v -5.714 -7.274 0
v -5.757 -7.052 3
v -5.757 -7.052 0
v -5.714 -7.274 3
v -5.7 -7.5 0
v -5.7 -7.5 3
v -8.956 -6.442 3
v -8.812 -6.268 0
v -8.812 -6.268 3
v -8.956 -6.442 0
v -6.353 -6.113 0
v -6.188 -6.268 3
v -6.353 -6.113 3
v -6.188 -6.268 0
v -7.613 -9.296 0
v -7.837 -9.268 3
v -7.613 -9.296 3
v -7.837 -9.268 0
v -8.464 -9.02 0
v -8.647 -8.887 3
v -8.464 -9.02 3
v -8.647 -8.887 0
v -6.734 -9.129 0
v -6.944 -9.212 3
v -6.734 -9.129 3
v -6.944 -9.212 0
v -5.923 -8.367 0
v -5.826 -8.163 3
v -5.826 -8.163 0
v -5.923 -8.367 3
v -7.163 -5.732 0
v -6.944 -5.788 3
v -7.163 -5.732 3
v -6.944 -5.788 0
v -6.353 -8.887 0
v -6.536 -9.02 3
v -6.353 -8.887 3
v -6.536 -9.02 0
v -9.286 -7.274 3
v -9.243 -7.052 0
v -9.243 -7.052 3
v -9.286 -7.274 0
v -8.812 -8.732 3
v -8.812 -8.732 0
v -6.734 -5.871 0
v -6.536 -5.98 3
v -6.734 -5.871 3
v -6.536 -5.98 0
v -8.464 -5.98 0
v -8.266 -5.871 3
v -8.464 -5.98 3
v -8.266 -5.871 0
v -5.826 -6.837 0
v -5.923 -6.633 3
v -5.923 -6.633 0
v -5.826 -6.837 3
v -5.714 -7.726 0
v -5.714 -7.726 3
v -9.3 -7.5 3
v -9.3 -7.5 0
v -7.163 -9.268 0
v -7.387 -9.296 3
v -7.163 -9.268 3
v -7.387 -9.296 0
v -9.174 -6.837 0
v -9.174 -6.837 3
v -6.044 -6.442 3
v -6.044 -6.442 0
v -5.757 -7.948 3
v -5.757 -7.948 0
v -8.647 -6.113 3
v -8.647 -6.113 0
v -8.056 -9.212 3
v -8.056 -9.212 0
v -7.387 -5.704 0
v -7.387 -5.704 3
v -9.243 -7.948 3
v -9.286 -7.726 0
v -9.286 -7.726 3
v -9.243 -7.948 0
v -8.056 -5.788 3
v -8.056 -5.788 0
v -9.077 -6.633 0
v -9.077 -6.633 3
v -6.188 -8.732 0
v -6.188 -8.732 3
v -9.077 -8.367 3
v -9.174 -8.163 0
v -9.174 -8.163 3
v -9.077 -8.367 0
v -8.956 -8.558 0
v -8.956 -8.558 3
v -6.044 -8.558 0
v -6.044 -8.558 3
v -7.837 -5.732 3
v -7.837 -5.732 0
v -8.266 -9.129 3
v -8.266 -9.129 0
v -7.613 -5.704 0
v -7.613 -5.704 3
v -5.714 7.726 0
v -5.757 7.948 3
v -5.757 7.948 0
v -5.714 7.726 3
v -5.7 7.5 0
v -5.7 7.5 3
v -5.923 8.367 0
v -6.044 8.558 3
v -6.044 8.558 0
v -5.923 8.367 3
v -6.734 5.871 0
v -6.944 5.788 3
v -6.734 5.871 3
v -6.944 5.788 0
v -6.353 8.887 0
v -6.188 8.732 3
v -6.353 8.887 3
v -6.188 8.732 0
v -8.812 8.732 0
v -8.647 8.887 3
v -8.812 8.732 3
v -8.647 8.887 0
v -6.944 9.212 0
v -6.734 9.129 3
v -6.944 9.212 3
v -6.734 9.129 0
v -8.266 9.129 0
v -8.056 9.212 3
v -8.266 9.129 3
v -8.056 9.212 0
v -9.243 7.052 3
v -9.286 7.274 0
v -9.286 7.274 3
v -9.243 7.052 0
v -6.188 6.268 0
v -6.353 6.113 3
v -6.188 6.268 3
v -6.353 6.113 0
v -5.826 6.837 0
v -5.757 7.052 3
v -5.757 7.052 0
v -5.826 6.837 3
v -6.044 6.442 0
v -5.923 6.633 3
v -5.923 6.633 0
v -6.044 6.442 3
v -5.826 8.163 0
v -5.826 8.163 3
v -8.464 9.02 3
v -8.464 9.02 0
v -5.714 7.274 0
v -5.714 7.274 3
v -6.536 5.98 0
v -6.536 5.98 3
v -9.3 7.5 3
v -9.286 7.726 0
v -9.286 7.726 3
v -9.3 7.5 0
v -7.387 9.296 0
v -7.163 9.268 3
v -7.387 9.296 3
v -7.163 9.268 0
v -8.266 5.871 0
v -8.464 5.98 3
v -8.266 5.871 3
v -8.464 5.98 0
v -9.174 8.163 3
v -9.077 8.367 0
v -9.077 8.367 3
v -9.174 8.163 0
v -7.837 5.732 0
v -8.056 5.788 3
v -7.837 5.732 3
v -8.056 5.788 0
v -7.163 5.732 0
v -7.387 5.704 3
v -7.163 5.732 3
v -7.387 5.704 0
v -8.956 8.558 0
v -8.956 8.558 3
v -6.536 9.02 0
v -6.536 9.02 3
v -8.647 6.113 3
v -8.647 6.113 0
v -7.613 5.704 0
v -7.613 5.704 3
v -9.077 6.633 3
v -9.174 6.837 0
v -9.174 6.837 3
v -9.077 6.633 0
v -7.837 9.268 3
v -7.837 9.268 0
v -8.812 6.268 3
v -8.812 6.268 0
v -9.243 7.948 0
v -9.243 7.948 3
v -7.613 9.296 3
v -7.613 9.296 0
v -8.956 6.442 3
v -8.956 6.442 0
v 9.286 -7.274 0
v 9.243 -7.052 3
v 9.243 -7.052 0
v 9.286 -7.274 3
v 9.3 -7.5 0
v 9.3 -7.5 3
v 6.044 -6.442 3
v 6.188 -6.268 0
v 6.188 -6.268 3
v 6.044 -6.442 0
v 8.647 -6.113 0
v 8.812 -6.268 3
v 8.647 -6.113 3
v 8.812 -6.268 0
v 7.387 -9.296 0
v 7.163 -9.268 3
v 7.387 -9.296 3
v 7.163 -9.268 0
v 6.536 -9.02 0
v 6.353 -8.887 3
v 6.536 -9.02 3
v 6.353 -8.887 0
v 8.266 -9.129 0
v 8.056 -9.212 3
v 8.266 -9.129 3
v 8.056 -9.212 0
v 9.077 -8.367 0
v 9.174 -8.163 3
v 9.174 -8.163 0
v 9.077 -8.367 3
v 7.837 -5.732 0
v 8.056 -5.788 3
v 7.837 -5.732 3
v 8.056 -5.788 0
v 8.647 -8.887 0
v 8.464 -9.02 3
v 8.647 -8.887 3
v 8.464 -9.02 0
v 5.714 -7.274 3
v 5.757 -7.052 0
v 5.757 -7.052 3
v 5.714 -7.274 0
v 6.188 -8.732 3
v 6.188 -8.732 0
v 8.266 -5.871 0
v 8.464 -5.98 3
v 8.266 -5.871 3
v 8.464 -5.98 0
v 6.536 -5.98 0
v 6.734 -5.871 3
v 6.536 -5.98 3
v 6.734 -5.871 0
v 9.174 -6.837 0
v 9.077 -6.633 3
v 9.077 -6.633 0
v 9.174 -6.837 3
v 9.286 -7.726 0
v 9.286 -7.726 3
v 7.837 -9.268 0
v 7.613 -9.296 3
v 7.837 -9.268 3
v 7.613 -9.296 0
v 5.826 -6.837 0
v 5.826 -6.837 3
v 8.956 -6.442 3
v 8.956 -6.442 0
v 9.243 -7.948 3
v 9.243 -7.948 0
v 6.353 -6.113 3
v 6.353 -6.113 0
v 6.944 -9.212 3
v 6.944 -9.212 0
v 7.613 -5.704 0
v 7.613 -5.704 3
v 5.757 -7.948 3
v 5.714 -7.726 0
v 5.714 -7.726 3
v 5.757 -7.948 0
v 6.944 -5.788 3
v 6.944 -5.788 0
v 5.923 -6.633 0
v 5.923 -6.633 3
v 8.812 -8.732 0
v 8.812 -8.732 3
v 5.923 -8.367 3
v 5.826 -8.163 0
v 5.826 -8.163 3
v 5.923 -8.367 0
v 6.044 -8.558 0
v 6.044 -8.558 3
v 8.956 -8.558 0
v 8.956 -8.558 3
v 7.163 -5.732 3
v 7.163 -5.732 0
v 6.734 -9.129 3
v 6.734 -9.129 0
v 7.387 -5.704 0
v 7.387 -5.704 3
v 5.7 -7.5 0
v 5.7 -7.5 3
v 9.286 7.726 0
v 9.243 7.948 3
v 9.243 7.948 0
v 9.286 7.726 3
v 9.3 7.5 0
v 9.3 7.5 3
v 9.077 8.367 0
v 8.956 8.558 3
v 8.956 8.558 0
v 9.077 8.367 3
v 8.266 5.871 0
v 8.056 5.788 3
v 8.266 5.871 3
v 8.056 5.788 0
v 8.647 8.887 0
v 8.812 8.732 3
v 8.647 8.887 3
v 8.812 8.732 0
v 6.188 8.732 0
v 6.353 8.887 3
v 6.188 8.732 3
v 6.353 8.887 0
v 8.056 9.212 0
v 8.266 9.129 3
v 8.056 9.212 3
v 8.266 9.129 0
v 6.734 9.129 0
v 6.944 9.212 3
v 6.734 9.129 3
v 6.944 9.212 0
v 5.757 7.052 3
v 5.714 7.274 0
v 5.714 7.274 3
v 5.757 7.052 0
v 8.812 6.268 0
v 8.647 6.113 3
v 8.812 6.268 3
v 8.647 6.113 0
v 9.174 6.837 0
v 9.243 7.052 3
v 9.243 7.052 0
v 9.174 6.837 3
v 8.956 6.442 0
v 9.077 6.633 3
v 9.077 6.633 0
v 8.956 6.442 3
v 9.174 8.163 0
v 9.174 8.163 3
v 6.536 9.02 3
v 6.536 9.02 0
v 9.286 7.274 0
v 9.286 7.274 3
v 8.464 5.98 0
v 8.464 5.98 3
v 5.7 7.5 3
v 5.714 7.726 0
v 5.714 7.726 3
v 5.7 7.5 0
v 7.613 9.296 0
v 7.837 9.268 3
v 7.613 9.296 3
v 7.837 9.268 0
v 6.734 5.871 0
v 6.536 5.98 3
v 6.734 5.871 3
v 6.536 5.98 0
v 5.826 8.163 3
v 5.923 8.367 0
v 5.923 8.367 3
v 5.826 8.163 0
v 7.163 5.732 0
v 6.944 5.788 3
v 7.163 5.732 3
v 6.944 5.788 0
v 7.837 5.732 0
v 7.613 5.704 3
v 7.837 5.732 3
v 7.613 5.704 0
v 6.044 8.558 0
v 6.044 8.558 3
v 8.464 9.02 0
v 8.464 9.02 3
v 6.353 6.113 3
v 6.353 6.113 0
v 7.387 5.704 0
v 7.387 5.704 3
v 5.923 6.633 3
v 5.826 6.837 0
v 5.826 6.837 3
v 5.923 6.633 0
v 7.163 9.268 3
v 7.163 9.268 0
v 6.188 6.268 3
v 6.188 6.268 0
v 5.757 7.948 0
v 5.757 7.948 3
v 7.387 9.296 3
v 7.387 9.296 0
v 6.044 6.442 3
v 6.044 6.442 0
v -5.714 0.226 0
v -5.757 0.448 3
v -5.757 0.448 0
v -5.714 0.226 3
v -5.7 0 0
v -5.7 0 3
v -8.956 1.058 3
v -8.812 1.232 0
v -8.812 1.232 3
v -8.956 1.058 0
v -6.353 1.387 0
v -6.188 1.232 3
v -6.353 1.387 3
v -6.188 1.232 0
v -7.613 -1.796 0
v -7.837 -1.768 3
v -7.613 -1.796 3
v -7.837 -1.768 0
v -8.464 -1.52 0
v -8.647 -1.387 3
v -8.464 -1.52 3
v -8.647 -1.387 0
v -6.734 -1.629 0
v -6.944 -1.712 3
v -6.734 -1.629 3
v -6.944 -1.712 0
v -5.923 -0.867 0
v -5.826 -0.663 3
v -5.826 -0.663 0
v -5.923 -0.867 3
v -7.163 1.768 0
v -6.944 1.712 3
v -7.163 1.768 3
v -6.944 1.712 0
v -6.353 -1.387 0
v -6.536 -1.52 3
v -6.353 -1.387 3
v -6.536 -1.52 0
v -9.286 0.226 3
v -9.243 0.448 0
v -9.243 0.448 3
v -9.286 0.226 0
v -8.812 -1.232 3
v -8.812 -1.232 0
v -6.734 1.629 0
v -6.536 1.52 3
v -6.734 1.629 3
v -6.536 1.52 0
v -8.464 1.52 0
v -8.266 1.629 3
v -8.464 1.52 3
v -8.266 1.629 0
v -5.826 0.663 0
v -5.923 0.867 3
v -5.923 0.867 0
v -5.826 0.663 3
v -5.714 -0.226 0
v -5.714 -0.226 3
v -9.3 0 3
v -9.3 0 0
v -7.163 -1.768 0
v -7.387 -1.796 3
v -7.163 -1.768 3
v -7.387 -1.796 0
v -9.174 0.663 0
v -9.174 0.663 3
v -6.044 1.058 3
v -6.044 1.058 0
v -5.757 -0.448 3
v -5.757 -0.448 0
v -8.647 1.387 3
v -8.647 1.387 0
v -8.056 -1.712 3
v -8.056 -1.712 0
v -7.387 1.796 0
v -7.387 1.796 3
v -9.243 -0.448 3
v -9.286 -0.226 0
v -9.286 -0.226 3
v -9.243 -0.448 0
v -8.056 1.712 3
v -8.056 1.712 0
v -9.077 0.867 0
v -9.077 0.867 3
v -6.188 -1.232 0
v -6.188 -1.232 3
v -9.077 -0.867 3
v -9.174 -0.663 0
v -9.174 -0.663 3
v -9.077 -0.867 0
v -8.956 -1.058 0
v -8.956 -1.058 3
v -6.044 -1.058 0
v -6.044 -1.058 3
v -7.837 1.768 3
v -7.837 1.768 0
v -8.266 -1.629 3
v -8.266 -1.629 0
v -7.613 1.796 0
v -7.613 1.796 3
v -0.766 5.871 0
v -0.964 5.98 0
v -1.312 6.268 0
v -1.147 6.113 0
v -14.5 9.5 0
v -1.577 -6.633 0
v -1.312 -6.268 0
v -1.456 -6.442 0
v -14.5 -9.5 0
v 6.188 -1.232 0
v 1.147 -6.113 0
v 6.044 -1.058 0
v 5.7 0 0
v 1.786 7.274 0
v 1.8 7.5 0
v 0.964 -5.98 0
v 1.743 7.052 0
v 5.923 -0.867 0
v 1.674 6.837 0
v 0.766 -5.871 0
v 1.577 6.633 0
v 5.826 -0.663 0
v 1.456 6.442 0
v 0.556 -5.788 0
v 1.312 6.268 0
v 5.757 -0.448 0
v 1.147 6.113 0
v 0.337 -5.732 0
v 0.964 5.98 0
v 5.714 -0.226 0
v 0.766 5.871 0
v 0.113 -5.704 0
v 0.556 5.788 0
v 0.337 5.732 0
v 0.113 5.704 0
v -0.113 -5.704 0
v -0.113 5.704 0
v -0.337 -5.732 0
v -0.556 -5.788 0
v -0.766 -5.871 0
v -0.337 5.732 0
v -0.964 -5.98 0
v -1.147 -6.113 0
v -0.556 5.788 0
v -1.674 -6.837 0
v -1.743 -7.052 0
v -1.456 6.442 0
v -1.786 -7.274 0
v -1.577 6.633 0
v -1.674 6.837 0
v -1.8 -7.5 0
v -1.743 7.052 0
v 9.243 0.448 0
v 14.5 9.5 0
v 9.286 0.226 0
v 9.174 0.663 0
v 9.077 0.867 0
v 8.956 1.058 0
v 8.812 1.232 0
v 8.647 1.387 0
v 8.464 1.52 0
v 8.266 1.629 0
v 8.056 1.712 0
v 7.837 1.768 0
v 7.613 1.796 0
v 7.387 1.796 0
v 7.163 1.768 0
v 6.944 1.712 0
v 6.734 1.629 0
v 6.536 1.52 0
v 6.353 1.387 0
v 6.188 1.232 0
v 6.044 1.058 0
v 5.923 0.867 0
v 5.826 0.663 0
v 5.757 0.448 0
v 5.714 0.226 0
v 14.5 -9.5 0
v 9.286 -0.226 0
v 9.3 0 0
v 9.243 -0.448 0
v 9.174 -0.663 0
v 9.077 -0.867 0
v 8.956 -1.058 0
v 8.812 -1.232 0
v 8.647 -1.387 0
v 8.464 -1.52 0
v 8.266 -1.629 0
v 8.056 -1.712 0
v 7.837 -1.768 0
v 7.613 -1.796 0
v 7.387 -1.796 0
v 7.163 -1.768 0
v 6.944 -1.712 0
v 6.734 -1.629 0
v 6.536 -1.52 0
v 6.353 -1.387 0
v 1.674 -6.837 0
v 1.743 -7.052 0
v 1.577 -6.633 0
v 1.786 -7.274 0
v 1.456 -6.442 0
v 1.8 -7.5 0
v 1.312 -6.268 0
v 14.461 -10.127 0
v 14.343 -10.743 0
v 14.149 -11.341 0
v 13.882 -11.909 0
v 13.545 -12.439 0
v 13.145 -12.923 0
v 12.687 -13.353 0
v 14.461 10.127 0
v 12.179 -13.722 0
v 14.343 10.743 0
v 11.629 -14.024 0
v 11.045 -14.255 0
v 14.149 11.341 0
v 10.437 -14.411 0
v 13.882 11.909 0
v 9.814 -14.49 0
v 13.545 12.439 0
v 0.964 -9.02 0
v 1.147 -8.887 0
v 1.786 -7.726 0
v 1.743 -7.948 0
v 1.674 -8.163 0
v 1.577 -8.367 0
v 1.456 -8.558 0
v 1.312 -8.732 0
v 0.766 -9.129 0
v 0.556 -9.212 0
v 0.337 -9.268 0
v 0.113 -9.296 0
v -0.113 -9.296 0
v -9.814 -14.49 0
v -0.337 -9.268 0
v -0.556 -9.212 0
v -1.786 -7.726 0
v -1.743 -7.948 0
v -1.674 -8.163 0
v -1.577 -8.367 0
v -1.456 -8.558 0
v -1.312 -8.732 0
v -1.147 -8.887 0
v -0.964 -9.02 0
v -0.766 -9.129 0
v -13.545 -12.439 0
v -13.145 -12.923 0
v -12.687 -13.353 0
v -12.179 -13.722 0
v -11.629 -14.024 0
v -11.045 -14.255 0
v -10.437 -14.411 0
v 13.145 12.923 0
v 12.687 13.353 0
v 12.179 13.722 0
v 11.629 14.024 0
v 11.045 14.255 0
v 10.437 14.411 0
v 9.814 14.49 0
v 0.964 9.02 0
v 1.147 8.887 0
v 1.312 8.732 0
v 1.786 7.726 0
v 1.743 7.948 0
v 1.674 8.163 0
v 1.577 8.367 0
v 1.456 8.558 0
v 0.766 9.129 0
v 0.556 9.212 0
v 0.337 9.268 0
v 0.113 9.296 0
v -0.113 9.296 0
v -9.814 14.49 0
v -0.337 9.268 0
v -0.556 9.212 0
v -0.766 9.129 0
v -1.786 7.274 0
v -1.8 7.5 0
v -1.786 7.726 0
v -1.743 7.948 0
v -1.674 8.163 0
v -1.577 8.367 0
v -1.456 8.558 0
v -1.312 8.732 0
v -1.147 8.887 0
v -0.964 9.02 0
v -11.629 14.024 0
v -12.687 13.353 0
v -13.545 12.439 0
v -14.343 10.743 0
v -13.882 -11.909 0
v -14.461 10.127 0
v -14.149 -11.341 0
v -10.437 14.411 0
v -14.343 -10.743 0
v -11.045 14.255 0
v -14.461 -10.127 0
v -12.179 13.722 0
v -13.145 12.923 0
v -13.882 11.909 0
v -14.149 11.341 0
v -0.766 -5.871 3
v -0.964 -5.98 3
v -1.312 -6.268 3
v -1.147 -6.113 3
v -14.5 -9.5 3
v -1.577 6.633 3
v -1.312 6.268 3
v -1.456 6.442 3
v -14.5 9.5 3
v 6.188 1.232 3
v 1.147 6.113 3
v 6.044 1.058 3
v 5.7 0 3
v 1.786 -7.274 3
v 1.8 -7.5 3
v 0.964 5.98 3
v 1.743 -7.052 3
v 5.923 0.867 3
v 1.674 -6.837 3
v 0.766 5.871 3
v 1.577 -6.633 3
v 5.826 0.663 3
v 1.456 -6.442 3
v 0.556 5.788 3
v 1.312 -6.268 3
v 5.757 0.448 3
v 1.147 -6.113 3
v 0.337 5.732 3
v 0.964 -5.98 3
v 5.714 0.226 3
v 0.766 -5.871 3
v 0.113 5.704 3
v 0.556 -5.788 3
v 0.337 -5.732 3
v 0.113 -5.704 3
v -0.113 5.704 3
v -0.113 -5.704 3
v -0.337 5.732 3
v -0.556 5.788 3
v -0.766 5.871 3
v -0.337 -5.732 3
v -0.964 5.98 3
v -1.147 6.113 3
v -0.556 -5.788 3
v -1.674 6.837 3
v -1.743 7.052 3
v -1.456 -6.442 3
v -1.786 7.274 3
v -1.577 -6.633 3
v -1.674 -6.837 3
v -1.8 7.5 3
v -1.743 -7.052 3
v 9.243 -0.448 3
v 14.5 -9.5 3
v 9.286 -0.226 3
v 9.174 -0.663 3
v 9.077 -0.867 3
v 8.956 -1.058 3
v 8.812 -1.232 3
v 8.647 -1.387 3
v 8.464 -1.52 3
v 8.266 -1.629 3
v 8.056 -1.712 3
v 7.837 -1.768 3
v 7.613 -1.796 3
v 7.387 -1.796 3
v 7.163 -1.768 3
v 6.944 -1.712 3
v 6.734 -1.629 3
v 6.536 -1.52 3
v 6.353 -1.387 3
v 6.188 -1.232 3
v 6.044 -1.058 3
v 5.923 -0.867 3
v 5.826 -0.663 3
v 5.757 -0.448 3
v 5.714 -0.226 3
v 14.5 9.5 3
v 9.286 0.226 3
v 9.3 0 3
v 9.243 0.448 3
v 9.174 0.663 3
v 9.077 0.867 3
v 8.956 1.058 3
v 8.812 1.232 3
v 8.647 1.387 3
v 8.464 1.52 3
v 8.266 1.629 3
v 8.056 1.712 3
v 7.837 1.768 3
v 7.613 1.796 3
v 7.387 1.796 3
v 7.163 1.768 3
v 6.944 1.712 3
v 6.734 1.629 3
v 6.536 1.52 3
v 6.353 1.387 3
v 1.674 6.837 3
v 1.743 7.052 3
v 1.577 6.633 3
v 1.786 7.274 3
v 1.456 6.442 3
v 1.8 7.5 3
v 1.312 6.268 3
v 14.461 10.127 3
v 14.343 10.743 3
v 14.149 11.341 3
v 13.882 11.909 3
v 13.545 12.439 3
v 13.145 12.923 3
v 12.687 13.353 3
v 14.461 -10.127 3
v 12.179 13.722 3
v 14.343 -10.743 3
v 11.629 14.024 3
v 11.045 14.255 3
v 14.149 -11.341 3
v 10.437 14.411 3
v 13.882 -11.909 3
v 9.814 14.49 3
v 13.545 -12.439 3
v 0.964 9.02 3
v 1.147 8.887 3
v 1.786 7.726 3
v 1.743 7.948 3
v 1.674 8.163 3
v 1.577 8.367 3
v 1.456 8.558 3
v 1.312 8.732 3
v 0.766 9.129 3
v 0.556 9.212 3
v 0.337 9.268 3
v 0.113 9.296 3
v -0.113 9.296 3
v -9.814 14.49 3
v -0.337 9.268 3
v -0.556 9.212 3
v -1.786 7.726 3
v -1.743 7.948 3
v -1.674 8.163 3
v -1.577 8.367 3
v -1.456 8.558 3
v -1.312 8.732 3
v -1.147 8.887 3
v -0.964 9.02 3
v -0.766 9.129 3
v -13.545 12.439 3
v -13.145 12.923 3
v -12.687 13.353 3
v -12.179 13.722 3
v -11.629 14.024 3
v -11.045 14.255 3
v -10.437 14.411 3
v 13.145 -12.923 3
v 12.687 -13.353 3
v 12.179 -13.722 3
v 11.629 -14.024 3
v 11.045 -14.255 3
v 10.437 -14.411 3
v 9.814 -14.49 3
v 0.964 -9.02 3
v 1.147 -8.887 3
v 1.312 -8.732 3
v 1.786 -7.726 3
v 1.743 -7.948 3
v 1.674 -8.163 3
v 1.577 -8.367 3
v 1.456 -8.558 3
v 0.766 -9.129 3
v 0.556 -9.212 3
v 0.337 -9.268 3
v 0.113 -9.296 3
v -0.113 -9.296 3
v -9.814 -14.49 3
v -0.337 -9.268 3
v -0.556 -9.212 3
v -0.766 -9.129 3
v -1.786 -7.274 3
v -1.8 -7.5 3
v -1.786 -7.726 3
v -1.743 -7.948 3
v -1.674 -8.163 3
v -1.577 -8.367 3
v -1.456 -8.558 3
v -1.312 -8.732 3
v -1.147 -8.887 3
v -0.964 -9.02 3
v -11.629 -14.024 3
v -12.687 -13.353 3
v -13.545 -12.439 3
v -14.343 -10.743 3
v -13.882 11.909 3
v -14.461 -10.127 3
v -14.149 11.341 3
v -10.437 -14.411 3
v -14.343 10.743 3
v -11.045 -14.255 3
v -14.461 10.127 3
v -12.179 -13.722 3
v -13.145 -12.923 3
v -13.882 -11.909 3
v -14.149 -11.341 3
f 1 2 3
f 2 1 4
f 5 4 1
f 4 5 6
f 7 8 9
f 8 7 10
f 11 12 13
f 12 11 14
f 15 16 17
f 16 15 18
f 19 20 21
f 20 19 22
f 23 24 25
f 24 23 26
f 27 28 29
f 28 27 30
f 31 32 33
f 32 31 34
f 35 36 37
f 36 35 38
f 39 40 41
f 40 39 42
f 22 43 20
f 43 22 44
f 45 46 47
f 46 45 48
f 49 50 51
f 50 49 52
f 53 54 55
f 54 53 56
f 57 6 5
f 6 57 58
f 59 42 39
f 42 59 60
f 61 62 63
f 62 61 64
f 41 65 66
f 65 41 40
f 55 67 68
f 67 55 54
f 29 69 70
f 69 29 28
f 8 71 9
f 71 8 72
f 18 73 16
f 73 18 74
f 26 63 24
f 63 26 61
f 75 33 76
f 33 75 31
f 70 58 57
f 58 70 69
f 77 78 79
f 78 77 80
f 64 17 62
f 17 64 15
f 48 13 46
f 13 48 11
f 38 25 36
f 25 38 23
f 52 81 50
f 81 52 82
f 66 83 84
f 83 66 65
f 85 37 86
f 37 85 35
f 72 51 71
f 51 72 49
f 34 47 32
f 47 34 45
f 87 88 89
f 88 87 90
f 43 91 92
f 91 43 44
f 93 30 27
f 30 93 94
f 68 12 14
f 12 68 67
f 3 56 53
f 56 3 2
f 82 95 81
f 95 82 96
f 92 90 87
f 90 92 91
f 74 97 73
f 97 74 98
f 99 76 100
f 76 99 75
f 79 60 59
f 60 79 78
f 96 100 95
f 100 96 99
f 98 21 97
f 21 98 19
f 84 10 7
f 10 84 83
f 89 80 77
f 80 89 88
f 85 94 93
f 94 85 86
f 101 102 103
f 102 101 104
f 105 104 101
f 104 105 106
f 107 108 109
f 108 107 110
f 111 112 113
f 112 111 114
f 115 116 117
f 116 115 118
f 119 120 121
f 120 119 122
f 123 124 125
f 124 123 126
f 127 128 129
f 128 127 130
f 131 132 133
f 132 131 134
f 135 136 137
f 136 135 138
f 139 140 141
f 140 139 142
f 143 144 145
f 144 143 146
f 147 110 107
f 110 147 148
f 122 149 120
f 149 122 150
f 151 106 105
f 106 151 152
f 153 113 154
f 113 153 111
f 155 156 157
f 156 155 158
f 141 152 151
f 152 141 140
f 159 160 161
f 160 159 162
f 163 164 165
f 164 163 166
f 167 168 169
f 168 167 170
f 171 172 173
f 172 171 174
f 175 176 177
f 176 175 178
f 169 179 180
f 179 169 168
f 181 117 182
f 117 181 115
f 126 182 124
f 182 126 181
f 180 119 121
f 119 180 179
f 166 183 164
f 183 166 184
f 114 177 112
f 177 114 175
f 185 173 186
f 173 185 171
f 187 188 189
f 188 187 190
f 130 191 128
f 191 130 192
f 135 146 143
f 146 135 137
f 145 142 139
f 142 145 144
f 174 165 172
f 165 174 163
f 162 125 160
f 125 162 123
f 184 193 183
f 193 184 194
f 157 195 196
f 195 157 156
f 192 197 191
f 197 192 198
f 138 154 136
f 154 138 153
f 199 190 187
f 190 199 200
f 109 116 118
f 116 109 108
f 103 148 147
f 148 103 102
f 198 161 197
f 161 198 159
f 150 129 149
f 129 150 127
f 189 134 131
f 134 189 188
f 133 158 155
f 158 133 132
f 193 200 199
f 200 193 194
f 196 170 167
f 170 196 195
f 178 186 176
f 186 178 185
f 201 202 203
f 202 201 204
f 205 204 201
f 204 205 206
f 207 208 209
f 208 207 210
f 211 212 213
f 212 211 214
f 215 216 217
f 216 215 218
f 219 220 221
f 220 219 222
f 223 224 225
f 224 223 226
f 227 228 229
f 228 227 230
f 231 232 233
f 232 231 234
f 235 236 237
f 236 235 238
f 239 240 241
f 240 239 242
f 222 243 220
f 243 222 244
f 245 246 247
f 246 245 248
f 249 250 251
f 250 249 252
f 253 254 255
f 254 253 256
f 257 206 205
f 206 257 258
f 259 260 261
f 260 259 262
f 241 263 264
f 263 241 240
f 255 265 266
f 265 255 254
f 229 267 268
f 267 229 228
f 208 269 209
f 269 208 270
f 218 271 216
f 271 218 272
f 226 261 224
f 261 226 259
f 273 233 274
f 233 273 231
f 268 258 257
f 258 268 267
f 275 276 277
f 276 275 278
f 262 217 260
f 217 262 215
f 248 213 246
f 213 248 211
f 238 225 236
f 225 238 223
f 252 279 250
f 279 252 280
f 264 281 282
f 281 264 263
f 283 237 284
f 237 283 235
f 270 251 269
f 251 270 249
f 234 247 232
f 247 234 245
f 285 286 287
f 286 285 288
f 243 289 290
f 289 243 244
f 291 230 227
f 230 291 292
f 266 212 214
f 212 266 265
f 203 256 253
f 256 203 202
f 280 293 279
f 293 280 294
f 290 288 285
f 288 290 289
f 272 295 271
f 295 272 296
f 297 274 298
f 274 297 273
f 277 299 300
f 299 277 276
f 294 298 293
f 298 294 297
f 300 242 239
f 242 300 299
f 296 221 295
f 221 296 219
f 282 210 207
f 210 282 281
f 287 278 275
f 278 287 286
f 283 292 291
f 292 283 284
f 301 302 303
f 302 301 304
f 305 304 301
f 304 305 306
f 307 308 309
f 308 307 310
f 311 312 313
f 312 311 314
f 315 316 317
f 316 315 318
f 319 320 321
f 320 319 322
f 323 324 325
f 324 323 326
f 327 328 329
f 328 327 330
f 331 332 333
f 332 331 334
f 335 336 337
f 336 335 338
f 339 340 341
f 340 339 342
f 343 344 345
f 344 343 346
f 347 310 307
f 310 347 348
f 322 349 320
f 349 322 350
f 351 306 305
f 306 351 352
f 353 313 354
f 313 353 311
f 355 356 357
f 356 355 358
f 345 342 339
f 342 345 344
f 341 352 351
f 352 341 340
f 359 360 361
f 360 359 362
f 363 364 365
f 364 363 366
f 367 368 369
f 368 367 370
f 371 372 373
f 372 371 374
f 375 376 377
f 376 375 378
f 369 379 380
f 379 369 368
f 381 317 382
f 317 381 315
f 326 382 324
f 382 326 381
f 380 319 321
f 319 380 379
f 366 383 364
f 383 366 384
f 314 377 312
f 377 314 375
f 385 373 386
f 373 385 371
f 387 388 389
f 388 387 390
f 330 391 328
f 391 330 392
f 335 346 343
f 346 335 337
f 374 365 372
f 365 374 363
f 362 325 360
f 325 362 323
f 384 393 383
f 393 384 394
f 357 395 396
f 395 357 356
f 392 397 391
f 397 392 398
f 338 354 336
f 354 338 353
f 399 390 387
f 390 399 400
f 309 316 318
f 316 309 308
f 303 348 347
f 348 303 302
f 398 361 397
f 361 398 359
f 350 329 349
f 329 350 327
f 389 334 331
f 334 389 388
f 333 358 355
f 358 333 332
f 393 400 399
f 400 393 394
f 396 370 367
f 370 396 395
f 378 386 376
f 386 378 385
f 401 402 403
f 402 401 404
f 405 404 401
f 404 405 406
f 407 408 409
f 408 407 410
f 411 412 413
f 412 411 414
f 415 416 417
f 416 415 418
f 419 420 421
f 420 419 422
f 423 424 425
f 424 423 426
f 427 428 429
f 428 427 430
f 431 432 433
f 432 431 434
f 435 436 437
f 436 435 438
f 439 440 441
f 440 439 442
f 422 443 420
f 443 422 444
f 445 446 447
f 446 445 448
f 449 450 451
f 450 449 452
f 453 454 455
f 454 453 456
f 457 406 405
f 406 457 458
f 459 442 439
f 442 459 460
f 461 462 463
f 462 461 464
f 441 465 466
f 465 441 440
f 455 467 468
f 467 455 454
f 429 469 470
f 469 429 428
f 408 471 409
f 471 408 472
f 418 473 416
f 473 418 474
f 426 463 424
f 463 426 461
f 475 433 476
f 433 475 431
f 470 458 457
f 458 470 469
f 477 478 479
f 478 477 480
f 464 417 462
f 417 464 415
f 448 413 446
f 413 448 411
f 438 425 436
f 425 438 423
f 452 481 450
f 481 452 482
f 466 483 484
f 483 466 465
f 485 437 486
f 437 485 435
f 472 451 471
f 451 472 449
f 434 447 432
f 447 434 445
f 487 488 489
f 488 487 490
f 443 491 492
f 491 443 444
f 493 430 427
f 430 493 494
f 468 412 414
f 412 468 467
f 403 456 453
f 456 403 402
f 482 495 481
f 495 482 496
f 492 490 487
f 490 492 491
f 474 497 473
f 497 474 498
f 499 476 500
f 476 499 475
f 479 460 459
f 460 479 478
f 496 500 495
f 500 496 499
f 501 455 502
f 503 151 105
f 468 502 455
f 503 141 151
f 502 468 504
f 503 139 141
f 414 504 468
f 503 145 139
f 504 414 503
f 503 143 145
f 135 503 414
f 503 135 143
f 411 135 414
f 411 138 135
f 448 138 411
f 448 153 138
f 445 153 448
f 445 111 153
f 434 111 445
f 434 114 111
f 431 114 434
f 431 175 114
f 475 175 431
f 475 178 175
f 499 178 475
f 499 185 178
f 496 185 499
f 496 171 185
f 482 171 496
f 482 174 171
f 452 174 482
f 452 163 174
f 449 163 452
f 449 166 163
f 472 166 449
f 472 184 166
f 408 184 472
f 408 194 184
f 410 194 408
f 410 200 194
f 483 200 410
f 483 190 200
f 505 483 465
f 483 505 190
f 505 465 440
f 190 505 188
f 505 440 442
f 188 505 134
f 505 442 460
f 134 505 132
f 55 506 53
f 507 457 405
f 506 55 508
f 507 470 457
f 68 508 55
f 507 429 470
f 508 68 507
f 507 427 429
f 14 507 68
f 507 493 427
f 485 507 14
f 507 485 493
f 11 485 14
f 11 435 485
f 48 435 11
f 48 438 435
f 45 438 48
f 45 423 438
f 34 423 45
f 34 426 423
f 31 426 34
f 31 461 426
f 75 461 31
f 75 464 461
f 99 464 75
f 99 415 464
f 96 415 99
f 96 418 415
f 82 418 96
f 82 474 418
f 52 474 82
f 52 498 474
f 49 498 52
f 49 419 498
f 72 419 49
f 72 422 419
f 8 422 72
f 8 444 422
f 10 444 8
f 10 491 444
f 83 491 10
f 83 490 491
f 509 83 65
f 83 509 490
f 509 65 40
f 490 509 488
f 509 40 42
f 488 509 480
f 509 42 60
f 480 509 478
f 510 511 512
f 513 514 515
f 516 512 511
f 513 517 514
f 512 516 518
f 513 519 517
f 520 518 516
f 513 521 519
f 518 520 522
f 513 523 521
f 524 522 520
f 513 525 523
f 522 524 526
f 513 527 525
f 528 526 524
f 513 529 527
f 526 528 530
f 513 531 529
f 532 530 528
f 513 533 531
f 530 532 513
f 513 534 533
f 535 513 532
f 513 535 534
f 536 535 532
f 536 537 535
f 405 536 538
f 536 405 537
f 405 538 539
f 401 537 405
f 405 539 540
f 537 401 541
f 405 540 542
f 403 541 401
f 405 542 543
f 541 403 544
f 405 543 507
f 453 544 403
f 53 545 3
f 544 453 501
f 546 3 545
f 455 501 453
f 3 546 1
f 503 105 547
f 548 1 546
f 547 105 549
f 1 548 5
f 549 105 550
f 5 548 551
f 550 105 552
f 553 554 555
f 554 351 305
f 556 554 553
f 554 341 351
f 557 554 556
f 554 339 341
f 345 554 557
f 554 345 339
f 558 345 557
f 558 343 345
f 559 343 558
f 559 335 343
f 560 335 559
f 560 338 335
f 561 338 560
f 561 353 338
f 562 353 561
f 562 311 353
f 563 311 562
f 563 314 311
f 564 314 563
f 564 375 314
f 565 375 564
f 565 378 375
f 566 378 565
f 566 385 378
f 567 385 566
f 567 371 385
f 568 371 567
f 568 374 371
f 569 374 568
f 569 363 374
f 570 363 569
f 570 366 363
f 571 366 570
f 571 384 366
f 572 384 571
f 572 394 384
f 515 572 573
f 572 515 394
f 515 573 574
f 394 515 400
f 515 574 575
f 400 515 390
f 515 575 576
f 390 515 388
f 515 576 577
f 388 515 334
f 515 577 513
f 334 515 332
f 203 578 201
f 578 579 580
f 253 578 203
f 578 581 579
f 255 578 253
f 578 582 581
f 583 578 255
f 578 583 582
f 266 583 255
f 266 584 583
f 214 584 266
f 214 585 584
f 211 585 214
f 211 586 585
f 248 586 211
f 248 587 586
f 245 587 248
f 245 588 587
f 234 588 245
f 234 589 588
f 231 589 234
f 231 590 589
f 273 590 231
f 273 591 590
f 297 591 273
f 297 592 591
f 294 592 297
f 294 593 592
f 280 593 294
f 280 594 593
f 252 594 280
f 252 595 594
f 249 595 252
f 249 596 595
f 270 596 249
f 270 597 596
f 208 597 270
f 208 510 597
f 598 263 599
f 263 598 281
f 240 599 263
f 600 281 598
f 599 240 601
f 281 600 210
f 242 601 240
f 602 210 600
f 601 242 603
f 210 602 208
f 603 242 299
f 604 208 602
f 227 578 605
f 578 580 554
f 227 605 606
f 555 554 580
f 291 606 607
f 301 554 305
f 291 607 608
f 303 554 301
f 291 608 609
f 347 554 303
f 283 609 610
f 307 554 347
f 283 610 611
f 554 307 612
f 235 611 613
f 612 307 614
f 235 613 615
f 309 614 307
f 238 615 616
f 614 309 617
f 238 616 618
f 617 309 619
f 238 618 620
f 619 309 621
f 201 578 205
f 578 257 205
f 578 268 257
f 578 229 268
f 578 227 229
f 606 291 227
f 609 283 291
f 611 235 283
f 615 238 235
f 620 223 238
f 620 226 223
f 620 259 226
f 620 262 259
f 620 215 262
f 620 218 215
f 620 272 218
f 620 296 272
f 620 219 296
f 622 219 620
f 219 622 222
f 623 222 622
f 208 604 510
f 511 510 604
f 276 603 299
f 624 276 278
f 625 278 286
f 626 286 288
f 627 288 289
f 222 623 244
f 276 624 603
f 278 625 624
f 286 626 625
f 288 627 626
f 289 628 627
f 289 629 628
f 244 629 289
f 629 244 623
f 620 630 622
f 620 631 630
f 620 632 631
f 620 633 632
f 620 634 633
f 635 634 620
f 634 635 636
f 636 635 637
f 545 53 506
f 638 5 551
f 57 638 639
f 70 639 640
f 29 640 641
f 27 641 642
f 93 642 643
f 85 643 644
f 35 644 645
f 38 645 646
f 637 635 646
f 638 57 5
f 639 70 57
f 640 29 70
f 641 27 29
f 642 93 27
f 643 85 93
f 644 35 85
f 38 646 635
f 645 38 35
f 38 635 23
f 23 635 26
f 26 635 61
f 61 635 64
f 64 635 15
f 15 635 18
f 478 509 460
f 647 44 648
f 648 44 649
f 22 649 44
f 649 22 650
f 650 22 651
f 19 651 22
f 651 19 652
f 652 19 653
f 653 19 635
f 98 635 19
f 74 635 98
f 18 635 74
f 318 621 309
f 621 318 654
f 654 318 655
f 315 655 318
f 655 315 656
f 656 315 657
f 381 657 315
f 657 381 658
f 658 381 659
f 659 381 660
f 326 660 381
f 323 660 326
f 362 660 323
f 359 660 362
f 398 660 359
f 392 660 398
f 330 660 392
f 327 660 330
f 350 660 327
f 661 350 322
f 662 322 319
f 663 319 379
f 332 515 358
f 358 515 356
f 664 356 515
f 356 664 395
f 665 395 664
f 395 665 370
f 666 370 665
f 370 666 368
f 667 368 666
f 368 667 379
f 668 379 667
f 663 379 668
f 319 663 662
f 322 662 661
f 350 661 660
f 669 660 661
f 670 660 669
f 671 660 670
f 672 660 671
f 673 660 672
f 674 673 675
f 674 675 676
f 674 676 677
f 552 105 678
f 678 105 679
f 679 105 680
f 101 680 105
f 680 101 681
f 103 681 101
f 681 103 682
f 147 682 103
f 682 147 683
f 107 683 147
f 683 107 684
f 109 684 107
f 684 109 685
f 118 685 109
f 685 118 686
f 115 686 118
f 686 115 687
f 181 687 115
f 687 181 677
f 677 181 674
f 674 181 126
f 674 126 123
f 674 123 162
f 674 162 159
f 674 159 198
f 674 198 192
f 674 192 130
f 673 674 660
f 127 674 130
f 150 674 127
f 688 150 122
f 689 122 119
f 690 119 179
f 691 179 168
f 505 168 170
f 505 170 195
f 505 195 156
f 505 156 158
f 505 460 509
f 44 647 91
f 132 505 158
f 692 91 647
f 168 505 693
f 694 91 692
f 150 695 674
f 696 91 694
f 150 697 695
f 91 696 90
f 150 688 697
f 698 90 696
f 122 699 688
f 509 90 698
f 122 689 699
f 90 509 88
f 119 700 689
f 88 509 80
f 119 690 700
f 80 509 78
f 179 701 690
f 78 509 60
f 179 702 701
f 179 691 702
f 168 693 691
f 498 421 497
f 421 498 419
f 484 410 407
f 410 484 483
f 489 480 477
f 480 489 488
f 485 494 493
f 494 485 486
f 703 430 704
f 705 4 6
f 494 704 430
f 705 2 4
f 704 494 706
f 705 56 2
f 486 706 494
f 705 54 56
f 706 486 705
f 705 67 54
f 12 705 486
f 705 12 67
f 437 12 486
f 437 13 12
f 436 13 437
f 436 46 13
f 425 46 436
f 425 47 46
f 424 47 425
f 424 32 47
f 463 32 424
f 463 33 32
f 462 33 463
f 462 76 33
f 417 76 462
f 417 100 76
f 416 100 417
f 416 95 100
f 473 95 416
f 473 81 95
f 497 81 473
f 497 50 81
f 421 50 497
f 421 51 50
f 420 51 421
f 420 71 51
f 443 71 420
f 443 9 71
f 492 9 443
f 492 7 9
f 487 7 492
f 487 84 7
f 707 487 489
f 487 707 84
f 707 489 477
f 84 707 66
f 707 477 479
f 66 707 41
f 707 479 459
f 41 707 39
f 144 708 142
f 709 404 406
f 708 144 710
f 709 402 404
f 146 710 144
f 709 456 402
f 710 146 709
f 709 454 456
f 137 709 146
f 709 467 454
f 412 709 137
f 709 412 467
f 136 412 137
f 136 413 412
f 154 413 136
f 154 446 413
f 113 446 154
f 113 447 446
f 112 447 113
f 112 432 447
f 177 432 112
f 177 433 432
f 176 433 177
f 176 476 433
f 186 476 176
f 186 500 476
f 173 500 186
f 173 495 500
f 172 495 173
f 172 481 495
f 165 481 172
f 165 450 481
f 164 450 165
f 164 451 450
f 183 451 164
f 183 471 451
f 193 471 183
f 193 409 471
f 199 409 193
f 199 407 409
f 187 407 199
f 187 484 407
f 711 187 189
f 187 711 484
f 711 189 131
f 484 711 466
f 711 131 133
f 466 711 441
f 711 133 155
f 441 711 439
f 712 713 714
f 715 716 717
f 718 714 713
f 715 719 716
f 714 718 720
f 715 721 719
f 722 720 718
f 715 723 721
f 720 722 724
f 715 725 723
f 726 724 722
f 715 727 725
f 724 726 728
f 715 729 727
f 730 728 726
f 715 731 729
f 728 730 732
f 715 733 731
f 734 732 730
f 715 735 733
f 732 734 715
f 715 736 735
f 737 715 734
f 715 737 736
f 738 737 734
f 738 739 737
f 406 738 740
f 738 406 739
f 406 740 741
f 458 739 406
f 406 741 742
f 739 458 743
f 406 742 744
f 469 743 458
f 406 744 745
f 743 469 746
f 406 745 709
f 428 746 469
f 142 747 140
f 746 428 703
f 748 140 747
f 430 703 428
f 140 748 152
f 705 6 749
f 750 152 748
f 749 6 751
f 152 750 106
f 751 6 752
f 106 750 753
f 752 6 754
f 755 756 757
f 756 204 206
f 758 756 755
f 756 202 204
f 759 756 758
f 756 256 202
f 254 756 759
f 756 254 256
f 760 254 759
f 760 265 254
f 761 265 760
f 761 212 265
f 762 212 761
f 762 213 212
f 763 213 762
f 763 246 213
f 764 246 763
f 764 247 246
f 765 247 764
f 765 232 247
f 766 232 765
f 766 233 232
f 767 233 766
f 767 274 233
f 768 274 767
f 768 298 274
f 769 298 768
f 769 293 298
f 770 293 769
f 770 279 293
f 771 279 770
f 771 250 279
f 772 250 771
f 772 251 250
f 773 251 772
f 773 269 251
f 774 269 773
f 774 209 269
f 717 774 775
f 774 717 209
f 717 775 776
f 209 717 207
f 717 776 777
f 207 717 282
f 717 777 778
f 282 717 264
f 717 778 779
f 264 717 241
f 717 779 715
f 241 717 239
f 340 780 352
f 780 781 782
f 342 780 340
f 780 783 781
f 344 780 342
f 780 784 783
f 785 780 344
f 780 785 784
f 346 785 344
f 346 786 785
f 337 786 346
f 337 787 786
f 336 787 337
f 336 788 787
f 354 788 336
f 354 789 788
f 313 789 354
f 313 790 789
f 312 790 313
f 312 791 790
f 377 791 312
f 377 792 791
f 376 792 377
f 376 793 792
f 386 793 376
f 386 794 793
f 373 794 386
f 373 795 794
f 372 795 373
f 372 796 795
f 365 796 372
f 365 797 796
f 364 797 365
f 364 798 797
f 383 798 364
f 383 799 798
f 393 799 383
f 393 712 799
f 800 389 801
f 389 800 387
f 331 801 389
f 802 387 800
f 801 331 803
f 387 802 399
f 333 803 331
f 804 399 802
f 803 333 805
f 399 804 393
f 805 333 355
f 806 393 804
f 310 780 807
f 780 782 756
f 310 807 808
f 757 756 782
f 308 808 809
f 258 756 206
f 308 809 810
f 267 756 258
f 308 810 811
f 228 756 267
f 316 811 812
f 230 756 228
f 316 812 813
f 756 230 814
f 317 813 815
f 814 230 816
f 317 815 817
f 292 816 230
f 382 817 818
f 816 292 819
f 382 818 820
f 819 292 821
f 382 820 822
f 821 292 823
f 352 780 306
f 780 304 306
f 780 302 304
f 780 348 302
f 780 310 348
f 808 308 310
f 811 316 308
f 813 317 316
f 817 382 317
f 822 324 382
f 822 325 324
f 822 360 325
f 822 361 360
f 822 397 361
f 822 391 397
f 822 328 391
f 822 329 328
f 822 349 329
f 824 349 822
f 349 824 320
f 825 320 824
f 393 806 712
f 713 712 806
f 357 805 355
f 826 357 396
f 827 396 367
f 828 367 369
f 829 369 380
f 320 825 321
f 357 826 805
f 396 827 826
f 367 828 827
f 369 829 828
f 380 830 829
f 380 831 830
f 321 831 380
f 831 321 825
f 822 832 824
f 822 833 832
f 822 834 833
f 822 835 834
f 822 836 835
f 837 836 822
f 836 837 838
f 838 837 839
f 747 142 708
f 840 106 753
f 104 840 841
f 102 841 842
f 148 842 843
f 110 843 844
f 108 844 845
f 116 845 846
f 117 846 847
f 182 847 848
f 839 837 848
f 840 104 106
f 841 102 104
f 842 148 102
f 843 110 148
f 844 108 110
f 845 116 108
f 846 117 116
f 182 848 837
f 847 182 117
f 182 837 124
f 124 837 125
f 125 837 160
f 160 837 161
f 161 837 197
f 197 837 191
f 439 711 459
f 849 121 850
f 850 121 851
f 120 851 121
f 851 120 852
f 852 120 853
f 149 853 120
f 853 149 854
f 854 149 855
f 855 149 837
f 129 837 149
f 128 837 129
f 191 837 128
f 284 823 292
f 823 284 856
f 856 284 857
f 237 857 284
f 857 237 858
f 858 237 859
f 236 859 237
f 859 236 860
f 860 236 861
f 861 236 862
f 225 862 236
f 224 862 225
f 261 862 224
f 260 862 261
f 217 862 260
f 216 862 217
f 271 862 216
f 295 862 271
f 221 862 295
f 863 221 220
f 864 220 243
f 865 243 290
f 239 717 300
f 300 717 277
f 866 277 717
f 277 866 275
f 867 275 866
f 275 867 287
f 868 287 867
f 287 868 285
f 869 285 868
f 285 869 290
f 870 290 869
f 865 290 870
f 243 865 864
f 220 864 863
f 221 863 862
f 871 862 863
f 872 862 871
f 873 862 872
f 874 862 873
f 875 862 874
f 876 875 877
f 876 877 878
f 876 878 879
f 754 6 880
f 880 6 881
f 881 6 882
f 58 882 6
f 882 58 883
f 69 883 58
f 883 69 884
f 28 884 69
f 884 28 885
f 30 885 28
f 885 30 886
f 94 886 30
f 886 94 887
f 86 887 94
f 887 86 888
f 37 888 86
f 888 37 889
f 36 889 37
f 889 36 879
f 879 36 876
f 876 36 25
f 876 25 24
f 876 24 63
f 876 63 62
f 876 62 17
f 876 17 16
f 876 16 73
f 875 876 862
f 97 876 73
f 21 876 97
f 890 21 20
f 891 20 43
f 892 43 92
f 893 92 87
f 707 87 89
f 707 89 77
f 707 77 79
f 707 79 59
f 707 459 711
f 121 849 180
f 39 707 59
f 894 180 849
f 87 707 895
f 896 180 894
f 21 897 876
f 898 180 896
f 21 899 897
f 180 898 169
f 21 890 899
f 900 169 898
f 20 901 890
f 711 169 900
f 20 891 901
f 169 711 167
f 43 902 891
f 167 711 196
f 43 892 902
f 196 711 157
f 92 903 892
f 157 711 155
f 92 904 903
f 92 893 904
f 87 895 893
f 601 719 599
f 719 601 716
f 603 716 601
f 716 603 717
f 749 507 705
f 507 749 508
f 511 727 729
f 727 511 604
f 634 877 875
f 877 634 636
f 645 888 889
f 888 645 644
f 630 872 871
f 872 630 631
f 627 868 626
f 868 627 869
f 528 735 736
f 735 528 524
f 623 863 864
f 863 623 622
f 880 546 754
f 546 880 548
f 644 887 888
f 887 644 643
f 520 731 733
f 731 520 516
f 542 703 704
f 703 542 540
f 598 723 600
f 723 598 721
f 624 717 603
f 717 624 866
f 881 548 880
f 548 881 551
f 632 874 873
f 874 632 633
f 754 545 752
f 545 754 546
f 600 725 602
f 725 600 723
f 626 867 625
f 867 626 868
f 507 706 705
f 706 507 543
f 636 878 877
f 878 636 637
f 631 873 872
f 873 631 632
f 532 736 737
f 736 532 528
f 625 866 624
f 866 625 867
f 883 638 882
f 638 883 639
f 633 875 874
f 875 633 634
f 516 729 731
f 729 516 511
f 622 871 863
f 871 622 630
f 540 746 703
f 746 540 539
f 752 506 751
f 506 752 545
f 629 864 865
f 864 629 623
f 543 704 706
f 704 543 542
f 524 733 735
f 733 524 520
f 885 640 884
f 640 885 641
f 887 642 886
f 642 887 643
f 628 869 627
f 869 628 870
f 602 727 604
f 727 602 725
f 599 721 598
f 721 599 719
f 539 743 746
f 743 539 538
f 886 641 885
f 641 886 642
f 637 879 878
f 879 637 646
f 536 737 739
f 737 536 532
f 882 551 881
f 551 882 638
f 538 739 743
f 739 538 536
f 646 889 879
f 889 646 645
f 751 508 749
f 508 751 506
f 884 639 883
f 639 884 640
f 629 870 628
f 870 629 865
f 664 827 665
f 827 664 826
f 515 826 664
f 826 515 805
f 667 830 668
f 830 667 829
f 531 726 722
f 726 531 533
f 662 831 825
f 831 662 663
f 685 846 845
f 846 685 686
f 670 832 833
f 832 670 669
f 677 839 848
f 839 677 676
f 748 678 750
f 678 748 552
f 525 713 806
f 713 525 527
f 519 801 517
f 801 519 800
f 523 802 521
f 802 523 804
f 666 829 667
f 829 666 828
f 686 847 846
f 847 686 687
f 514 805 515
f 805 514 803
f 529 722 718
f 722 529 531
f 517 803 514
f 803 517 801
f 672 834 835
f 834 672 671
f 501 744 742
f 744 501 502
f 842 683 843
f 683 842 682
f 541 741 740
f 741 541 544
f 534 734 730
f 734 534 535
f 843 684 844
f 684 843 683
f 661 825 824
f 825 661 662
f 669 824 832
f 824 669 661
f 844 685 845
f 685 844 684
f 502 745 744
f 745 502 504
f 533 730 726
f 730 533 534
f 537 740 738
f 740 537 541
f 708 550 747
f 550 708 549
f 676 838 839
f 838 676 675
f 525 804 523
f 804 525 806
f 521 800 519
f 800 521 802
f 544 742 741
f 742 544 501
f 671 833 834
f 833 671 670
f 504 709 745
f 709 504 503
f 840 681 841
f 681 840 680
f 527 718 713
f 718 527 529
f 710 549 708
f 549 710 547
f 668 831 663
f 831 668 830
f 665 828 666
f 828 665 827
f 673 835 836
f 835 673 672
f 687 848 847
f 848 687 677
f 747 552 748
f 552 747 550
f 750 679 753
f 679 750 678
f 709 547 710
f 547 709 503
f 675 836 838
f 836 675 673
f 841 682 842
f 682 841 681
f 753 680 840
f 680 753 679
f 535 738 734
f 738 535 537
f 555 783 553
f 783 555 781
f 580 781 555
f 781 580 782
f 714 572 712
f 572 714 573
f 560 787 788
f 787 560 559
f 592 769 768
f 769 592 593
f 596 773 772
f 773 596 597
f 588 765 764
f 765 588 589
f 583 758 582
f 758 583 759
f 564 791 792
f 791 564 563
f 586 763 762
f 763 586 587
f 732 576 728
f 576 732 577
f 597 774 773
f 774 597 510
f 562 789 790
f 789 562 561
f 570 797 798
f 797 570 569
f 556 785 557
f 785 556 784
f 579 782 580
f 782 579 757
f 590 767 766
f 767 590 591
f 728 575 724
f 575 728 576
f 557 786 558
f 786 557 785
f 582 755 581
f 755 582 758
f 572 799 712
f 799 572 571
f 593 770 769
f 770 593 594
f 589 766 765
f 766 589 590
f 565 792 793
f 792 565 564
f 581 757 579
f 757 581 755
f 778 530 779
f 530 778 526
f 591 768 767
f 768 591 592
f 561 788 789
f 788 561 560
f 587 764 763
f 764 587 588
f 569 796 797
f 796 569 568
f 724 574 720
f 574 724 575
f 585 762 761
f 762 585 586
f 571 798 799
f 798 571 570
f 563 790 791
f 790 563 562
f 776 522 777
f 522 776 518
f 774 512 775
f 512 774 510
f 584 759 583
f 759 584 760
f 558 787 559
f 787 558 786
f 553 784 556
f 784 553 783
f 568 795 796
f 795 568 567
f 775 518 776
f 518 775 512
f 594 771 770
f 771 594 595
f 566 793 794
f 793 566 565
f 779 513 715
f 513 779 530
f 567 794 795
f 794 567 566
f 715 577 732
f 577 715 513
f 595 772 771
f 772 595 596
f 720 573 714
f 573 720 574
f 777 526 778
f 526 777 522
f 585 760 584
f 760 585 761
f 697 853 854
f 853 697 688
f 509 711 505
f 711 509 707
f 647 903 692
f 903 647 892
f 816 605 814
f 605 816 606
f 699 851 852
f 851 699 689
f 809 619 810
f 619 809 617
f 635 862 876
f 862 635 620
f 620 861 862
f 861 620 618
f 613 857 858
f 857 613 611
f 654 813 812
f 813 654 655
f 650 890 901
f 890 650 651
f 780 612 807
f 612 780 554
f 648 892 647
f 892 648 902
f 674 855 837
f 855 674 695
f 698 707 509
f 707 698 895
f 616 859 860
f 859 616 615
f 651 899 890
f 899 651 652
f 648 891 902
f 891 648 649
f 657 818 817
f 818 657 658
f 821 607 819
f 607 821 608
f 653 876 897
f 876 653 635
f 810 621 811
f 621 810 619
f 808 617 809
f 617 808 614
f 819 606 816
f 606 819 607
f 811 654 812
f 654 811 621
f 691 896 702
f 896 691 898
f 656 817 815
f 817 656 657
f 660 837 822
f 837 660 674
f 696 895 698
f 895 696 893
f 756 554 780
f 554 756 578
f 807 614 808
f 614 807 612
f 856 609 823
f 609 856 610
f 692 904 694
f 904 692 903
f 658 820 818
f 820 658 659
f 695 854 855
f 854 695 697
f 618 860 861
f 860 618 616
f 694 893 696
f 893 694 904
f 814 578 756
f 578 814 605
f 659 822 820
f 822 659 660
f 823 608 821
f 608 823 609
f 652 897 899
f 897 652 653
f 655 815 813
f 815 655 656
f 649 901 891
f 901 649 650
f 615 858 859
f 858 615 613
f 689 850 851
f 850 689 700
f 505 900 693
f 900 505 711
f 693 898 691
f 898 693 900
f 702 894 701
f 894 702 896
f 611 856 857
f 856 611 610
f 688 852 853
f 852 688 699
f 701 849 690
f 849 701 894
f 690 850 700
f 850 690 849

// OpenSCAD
$fn = 50;


difference() {
	union() {
		hull() {
			translate(v = [-9.5000000000, 9.5000000000, 0]) {
				cylinder(h = 3, r = 5);
			}
			translate(v = [9.5000000000, 9.5000000000, 0]) {
				cylinder(h = 3, r = 5);
			}
			translate(v = [-9.5000000000, -9.5000000000, 0]) {
				cylinder(h = 3, r = 5);
			}
			translate(v = [9.5000000000, -9.5000000000, 0]) {
				cylinder(h = 3, r = 5);
			}
		}
	}
	union() {
		translate(v = [-7.5000000000, -7.5000000000, -100.0000000000]) {
			cylinder(h = 200, r = 1.8000000000);
		}
		translate(v = [-7.5000000000, 7.5000000000, -100.0000000000]) {
			cylinder(h = 200, r = 1.8000000000);
		}
		translate(v = [7.5000000000, -7.5000000000, -100.0000000000]) {
			cylinder(h = 200, r = 1.8000000000);
		}
		translate(v = [7.5000000000, 7.5000000000, -100.0000000000]) {
			cylinder(h = 200, r = 1.8000000000);
		}
		translate(v = [-7.5000000000, -7.5000000000, 0]) {
			cylinder(h = 3, r = 1.8000000000);
		}
		translate(v = [-7.5000000000, 0.0000000000, 0]) {
			cylinder(h = 3, r = 1.8000000000);
		}
		translate(v = [-7.5000000000, 7.5000000000, 0]) {
			cylinder(h = 3, r = 1.8000000000);
		}
		translate(v = [0.0000000000, -7.5000000000, 0]) {
			cylinder(h = 3, r = 1.8000000000);
		}
		translate(v = [0.0000000000, 7.5000000000, 0]) {
			cylinder(h = 3, r = 1.8000000000);
		}
		translate(v = [7.5000000000, -7.5000000000, 0]) {
			cylinder(h = 3, r = 1.8000000000);
		}
		translate(v = [7.5000000000, 0.0000000000, 0]) {
			cylinder(h = 3, r = 1.8000000000);
		}
		translate(v = [7.5000000000, 7.5000000000, 0]) {
			cylinder(h = 3, r = 1.8000000000);
		}
		translate(v = [-7.5000000000, -7.5000000000, 0]) {
			cylinder(h = 3, r = 1.8000000000);
		}
		translate(v = [-7.5000000000, 0.0000000000, 0]) {
			cylinder(h = 3, r = 1.8000000000);
		}
		translate(v = [-7.5000000000, 7.5000000000, 0]) {
			cylinder(h = 3, r = 1.8000000000);
		}
		translate(v = [0.0000000000, -7.5000000000, 0]) {
			cylinder(h = 3, r = 1.8000000000);
		}
		translate(v = [0.0000000000, 7.5000000000, 0]) {
			cylinder(h = 3, r = 1.8000000000);
		}
		translate(v = [7.5000000000, -7.5000000000, 0]) {
			cylinder(h = 3, r = 1.8000000000);
		}
		translate(v = [7.5000000000, 0.0000000000, 0]) {
			cylinder(h = 3, r = 1.8000000000);
		}
		translate(v = [7.5000000000, 7.5000000000, 0]) {
			cylinder(h = 3, r = 1.8000000000);
		}
		translate(v = [-7.5000000000, -7.5000000000, 0]) {
			cylinder(h = 3, r = 1.8000000000);
		}
		translate(v = [-7.5000000000, 0.0000000000, 0]) {
			cylinder(h = 3, r = 1.8000000000);
		}
		translate(v = [-7.5000000000, 7.5000000000, 0]) {
			cylinder(h = 3, r = 1.8000000000);
		}
		translate(v = [0.0000000000, -7.5000000000, 0]) {
			cylinder(h = 3, r = 1.8000000000);
		}
		translate(v = [0.0000000000, 7.5000000000, 0]) {
			cylinder(h = 3, r = 1.8000000000);
		}
		translate(v = [7.5000000000, -7.5000000000, 0]) {
			cylinder(h = 3, r = 1.8000000000);
		}
		translate(v = [7.5000000000, 0.0000000000, 0]) {
			cylinder(h = 3, r = 1.8000000000);
		}
		translate(v = [7.5000000000, 7.5000000000, 0]) {
			cylinder(h = 3, r = 1.8000000000);
		}
	}
}
